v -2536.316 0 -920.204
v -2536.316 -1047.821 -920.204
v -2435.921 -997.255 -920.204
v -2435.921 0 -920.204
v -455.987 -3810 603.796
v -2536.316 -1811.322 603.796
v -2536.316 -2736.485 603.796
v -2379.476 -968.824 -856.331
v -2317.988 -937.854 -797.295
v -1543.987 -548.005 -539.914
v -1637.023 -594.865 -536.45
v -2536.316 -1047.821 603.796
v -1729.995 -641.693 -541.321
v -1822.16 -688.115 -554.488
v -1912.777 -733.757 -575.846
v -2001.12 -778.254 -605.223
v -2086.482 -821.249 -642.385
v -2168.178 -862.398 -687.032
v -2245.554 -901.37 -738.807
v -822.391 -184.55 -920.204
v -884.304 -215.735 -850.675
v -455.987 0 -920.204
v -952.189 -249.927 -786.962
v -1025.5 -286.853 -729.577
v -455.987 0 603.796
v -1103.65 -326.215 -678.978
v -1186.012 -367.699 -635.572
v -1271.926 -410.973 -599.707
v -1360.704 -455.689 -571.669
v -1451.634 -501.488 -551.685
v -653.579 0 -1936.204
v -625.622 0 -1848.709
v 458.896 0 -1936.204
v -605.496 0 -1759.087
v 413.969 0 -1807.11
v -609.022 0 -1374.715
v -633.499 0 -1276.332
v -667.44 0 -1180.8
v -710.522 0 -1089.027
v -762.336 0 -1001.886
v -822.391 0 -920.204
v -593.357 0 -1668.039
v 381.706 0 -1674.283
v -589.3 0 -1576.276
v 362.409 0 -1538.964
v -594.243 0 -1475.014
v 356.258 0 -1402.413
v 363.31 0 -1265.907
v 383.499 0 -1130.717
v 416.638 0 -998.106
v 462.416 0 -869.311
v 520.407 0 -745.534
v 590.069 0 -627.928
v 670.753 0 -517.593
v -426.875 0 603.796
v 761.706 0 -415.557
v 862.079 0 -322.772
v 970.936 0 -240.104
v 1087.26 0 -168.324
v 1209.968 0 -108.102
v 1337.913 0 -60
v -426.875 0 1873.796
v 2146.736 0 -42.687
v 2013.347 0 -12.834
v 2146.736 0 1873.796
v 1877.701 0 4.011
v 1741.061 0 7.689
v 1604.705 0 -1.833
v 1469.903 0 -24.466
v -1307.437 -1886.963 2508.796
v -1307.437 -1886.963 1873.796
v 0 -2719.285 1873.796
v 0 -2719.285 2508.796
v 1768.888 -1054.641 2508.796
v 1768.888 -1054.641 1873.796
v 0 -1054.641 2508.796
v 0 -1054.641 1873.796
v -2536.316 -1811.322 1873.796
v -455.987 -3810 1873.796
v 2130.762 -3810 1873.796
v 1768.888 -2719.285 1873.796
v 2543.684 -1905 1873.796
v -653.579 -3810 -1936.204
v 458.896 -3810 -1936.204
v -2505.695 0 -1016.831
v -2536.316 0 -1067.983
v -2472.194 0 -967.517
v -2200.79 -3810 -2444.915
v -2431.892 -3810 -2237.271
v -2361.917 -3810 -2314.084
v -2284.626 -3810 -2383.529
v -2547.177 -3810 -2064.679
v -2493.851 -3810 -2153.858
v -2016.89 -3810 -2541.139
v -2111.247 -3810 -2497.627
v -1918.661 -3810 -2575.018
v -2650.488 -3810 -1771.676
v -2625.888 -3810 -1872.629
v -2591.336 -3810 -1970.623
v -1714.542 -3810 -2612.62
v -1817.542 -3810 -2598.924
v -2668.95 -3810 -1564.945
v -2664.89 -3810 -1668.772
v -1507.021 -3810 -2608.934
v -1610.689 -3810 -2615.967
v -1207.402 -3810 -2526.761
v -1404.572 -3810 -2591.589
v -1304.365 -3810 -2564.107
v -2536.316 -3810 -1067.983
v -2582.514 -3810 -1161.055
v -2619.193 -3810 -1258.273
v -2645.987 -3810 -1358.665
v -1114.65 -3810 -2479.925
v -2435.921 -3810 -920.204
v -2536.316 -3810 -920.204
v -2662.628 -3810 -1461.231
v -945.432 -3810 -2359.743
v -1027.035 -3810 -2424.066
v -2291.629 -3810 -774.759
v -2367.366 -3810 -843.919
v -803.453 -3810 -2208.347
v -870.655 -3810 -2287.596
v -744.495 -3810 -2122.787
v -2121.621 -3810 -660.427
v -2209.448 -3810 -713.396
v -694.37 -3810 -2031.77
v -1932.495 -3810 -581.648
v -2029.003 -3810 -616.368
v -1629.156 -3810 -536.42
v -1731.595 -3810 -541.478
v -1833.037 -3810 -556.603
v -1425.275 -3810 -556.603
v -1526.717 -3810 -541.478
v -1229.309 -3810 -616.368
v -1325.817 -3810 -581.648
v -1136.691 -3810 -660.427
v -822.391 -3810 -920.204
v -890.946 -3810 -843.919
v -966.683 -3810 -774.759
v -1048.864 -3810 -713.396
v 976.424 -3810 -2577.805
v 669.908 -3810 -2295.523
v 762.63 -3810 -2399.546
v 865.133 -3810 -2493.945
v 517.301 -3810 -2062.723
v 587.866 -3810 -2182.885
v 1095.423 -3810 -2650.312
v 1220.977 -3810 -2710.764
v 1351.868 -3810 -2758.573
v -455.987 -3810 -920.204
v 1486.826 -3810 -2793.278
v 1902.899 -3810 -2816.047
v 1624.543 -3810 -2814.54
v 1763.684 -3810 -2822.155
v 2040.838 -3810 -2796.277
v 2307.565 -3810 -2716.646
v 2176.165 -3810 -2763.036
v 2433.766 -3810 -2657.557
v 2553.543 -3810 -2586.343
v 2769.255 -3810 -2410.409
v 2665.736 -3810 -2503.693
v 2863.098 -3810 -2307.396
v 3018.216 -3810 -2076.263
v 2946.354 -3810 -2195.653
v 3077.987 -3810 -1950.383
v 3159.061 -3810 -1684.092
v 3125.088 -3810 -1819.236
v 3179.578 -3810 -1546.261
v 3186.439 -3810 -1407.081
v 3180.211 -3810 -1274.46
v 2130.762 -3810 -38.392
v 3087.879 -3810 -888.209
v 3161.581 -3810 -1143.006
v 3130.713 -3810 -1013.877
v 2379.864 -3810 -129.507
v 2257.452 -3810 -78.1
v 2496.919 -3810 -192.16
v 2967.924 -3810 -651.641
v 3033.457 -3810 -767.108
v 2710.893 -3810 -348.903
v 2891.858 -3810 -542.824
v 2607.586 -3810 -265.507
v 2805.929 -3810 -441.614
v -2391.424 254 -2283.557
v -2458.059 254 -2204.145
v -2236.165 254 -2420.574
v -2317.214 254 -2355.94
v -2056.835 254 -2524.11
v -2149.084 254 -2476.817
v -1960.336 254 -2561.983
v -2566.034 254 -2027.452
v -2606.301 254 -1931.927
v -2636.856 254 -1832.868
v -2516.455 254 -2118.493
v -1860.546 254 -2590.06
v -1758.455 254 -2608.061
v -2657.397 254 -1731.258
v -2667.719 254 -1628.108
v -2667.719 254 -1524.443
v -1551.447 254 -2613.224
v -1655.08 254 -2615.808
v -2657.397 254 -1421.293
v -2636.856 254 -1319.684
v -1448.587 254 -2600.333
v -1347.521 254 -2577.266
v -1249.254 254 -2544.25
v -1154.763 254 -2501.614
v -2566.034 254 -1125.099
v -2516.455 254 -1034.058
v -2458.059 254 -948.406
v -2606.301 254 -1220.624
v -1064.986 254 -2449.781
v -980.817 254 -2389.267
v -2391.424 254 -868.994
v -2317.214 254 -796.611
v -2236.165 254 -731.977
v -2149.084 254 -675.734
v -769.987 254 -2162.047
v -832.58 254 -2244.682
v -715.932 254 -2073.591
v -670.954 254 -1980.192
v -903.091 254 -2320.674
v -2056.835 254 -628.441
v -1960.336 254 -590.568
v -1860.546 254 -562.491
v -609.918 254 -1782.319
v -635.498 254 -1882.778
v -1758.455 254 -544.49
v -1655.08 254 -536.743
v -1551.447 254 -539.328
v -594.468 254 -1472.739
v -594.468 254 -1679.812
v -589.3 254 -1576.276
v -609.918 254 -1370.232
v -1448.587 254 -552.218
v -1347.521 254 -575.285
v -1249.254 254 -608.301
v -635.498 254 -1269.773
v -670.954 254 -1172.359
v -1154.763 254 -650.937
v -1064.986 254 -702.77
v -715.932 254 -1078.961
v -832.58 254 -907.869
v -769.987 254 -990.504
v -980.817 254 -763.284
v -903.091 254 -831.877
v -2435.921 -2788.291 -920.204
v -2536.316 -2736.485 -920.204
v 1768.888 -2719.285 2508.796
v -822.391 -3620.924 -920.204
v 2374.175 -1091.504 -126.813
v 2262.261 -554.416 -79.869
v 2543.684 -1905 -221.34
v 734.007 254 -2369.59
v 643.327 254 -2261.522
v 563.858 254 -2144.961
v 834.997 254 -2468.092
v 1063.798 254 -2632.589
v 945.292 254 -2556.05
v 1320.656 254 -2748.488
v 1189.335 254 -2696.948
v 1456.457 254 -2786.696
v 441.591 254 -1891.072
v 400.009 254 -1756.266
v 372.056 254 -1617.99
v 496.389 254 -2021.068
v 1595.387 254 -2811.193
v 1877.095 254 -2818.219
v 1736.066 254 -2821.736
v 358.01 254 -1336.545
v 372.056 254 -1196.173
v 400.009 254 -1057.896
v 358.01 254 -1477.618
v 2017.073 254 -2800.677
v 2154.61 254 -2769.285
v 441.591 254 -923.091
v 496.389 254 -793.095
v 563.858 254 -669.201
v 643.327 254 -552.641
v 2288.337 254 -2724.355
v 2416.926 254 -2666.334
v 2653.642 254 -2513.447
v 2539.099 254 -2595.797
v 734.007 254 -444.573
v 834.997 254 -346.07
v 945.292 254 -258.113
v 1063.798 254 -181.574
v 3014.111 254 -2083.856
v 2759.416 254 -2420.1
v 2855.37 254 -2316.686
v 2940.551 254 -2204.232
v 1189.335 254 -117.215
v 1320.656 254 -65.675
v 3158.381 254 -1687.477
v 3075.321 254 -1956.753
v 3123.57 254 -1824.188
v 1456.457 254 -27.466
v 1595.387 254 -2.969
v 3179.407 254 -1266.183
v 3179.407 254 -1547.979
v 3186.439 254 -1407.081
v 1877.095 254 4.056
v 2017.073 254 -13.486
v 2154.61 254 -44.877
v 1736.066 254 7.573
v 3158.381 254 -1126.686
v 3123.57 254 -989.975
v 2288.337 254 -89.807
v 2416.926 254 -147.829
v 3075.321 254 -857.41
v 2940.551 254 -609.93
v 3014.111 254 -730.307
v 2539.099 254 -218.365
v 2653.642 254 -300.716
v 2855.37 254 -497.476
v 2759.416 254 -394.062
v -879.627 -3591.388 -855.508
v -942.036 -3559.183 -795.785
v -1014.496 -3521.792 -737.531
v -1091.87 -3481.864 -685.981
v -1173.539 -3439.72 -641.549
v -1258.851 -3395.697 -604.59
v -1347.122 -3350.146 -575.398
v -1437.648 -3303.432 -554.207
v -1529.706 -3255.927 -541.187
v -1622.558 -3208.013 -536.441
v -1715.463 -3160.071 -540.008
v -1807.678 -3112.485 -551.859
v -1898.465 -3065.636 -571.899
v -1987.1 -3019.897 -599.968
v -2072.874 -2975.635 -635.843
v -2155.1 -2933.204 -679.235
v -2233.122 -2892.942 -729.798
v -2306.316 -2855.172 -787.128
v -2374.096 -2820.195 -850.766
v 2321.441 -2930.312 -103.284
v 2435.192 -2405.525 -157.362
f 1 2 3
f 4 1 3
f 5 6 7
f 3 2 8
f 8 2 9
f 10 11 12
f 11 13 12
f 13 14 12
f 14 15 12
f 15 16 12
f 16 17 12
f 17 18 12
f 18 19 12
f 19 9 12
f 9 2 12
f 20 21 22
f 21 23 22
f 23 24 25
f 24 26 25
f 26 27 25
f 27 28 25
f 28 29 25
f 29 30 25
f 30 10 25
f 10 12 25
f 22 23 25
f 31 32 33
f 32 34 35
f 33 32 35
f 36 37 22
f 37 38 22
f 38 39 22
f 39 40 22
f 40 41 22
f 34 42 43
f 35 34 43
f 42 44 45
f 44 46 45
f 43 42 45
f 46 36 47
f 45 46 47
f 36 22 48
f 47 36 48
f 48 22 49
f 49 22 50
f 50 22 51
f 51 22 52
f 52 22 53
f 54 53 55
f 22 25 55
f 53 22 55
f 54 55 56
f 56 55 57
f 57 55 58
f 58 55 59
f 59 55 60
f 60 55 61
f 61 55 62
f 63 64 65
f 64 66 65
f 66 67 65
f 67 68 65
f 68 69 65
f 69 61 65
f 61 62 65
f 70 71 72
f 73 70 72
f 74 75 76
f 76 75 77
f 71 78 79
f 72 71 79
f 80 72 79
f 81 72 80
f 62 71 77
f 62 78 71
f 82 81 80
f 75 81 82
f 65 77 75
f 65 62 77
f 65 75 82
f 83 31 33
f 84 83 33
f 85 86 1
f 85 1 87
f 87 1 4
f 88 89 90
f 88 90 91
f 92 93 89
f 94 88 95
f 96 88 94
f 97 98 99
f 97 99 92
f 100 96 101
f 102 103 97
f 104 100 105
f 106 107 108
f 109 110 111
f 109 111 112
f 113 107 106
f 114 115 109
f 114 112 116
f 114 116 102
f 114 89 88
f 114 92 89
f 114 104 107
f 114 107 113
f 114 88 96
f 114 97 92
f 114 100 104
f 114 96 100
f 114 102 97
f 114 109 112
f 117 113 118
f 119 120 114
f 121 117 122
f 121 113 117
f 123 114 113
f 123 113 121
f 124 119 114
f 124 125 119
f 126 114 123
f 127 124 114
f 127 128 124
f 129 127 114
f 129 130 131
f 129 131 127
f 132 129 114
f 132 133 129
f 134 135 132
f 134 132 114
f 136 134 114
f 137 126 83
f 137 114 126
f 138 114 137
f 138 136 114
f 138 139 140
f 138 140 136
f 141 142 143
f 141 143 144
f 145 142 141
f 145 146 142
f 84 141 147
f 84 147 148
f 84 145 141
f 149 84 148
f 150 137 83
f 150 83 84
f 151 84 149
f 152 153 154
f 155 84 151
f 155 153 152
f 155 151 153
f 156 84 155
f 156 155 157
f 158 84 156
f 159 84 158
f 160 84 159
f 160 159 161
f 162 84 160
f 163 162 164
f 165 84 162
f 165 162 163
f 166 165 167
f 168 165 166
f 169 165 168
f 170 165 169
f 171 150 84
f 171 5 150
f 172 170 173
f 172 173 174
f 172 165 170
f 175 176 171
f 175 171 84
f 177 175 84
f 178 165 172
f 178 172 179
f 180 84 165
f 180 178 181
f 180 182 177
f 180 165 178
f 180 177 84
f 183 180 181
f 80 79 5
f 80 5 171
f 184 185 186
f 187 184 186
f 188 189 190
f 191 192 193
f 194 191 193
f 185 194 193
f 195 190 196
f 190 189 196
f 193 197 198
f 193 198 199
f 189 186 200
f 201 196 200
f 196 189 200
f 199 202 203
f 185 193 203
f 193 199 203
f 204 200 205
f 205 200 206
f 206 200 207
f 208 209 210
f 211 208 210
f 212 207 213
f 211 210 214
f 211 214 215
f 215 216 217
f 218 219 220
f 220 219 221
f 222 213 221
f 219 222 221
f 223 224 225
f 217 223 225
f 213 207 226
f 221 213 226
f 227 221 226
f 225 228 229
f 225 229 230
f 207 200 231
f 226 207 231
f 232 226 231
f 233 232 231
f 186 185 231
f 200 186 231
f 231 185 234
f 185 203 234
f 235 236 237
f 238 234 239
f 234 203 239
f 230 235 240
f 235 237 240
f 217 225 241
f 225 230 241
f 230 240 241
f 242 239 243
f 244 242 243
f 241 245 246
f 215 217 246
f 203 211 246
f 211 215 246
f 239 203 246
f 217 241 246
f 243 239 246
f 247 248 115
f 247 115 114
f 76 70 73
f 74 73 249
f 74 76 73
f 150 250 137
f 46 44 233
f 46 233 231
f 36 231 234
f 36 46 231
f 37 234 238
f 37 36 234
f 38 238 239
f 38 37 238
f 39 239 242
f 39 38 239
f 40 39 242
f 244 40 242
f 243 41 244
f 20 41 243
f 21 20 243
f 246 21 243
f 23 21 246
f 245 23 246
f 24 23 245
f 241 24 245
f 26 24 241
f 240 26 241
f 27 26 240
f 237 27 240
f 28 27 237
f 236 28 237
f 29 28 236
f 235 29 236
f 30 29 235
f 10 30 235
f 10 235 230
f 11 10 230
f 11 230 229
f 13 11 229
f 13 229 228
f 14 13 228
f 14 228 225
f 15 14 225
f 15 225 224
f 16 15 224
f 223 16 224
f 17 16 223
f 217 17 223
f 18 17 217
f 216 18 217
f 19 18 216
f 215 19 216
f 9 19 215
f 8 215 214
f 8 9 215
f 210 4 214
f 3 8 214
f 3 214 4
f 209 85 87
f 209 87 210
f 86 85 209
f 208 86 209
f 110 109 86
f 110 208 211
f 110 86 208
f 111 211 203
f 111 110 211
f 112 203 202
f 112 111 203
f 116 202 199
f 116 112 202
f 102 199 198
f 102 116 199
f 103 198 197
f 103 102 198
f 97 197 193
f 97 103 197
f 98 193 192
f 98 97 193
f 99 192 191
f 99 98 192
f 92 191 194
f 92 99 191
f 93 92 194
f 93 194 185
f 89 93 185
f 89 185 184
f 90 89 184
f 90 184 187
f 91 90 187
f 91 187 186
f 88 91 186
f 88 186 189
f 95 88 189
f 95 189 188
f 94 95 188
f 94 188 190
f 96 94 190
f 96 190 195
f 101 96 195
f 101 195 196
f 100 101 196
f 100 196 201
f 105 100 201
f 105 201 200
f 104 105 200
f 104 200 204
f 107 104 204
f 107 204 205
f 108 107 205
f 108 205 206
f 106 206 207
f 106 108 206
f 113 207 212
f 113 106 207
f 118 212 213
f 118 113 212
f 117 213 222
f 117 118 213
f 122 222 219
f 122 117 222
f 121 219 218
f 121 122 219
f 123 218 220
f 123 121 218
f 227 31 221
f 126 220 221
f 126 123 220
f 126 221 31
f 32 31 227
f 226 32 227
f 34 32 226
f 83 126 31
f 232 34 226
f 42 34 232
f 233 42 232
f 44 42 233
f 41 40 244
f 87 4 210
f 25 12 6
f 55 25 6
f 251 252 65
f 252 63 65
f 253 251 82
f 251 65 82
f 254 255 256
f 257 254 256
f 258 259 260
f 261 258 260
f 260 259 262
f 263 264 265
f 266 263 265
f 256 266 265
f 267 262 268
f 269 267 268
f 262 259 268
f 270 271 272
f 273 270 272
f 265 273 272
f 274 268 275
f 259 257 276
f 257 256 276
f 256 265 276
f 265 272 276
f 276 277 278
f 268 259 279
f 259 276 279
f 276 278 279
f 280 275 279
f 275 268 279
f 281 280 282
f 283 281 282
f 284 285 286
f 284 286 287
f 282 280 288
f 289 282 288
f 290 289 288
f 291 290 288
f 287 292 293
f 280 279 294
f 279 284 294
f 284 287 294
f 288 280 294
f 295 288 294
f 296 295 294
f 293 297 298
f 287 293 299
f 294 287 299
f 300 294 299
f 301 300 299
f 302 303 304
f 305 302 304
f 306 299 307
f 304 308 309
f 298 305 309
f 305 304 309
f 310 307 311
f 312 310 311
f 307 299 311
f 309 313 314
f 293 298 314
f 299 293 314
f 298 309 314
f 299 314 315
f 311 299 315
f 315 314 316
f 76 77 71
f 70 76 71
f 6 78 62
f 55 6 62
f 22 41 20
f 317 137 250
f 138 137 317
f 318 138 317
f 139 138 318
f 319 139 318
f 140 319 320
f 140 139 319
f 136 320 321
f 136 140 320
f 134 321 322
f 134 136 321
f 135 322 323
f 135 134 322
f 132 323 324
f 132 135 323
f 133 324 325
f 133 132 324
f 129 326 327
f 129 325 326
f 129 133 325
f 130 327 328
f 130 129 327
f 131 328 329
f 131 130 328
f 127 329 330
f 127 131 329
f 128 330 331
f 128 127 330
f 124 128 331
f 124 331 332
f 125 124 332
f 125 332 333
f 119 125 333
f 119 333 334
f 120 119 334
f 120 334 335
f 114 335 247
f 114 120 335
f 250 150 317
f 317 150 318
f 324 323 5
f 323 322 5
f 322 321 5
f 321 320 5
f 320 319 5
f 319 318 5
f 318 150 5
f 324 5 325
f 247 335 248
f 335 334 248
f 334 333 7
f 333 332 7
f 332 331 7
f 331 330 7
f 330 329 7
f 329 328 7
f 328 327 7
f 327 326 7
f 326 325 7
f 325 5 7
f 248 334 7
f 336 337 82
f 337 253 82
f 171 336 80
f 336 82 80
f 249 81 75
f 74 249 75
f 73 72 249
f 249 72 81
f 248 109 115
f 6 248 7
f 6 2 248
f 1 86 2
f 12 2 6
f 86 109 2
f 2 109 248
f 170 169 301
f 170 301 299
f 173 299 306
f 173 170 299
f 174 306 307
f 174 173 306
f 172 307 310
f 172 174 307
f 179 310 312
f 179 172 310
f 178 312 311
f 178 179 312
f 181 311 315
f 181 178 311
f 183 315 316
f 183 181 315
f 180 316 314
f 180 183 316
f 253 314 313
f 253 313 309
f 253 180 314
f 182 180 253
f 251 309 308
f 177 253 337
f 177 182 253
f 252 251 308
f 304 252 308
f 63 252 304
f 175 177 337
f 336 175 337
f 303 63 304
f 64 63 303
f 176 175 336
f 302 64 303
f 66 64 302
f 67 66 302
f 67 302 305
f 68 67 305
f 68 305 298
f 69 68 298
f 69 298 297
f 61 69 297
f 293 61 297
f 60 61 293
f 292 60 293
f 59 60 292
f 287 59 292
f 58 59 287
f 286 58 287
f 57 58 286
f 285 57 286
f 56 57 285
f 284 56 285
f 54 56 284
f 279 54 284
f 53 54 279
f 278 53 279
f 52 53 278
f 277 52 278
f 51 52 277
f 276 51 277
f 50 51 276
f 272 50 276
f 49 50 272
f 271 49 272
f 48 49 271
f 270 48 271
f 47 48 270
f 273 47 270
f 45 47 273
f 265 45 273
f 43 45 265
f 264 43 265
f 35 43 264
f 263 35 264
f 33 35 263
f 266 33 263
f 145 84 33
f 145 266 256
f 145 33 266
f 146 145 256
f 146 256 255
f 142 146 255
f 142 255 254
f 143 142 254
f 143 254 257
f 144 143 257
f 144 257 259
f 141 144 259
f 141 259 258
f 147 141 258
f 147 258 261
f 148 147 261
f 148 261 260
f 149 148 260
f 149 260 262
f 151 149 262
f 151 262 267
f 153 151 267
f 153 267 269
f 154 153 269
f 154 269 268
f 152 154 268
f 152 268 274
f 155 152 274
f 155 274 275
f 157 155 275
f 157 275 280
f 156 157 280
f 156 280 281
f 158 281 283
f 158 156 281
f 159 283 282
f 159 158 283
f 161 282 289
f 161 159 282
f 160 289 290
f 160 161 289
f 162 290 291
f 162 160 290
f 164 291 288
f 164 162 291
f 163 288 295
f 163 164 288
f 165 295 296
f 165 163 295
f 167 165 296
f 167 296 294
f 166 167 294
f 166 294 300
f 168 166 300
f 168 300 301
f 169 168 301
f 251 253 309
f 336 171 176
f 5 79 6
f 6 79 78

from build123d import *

# Parameters (mm, degrees)
F0_W      = 5080
F0_H      = 3810
F1_DEPTH  = 3810
F3_DEPTH  = 1270
F5_DEPTH  = 5080
F7_DEPTH  = 1524
F9_DEPTH  = 635
F10_R     = 1039.855614
F10_R_2   = 1415.094292
F11_DEPTH = 4064


with BuildPart() as f1:
    # F0 (on Front) → F1 (new body)
    with BuildSketch(Plane.XZ):
        with Locations((3.684264, -31.204443)):
            Rectangle(F0_W, F0_H)
    extrude(amount=F1_DEPTH)

    # F2 (on face) → F3 (cut)
    with BuildSketch(Plane.XY.offset(1873.795557)):
        Polygon((-2536.315736, 0), (-2536.315736, -1811.321616), (-426.875174, 0), align=None)
        Polygon((-455.987006, -3810), (-2536.315736, -1811.321616), (-2536.315736, -3810), align=None)
    extrude(amount=-F3_DEPTH, mode=Mode.SUBTRACT)

    # F4 (on face) → F5 (cut)
    with BuildSketch(Plane.XY.offset(1873.795557)):
        Polygon((2146.736383, 0), (2543.684264, -1905), (2543.684264, 0), align=None)
        Polygon((2543.684264, -1905), (2130.7621, -3810), (2543.684264, -3810), align=None)
    extrude(amount=-F5_DEPTH, mode=Mode.SUBTRACT)

    # F6 (on face) → F7 (cut)
    with BuildSketch(Plane.XY.offset(603.795557)):
        Polygon((-455.987006, -3810), (-2536.315736, -2736.484766), (-2536.315736, -3810), align=None)
        Polygon((-2536.315736, 0), (-2536.315736, -1047.821403), (-455.987006, 0), align=None)
    extrude(amount=-F7_DEPTH, mode=Mode.SUBTRACT)

    # F8 (on face) → F9 (join)
    with BuildSketch(Plane.XY.offset(1873.795557)):
        Polygon((-1307.437301, -1886.96295), (0, -2719.284534), (1768.888235, -2719.284534), (1768.888235, -1054.641366), (0, -1054.641366), align=None)
    extrude(amount=F9_DEPTH)

    # F10 (on face) → F11 (join)
    with BuildSketch(Plane.XZ.offset(3810)):
        with Locations((-1629.155993, -1576.275587)):
            Circle(F10_R)
        with Locations((1771.344781, -1407.081366)):
            Circle(F10_R_2)
    extrude(amount=-F11_DEPTH)


solid = f1.part
